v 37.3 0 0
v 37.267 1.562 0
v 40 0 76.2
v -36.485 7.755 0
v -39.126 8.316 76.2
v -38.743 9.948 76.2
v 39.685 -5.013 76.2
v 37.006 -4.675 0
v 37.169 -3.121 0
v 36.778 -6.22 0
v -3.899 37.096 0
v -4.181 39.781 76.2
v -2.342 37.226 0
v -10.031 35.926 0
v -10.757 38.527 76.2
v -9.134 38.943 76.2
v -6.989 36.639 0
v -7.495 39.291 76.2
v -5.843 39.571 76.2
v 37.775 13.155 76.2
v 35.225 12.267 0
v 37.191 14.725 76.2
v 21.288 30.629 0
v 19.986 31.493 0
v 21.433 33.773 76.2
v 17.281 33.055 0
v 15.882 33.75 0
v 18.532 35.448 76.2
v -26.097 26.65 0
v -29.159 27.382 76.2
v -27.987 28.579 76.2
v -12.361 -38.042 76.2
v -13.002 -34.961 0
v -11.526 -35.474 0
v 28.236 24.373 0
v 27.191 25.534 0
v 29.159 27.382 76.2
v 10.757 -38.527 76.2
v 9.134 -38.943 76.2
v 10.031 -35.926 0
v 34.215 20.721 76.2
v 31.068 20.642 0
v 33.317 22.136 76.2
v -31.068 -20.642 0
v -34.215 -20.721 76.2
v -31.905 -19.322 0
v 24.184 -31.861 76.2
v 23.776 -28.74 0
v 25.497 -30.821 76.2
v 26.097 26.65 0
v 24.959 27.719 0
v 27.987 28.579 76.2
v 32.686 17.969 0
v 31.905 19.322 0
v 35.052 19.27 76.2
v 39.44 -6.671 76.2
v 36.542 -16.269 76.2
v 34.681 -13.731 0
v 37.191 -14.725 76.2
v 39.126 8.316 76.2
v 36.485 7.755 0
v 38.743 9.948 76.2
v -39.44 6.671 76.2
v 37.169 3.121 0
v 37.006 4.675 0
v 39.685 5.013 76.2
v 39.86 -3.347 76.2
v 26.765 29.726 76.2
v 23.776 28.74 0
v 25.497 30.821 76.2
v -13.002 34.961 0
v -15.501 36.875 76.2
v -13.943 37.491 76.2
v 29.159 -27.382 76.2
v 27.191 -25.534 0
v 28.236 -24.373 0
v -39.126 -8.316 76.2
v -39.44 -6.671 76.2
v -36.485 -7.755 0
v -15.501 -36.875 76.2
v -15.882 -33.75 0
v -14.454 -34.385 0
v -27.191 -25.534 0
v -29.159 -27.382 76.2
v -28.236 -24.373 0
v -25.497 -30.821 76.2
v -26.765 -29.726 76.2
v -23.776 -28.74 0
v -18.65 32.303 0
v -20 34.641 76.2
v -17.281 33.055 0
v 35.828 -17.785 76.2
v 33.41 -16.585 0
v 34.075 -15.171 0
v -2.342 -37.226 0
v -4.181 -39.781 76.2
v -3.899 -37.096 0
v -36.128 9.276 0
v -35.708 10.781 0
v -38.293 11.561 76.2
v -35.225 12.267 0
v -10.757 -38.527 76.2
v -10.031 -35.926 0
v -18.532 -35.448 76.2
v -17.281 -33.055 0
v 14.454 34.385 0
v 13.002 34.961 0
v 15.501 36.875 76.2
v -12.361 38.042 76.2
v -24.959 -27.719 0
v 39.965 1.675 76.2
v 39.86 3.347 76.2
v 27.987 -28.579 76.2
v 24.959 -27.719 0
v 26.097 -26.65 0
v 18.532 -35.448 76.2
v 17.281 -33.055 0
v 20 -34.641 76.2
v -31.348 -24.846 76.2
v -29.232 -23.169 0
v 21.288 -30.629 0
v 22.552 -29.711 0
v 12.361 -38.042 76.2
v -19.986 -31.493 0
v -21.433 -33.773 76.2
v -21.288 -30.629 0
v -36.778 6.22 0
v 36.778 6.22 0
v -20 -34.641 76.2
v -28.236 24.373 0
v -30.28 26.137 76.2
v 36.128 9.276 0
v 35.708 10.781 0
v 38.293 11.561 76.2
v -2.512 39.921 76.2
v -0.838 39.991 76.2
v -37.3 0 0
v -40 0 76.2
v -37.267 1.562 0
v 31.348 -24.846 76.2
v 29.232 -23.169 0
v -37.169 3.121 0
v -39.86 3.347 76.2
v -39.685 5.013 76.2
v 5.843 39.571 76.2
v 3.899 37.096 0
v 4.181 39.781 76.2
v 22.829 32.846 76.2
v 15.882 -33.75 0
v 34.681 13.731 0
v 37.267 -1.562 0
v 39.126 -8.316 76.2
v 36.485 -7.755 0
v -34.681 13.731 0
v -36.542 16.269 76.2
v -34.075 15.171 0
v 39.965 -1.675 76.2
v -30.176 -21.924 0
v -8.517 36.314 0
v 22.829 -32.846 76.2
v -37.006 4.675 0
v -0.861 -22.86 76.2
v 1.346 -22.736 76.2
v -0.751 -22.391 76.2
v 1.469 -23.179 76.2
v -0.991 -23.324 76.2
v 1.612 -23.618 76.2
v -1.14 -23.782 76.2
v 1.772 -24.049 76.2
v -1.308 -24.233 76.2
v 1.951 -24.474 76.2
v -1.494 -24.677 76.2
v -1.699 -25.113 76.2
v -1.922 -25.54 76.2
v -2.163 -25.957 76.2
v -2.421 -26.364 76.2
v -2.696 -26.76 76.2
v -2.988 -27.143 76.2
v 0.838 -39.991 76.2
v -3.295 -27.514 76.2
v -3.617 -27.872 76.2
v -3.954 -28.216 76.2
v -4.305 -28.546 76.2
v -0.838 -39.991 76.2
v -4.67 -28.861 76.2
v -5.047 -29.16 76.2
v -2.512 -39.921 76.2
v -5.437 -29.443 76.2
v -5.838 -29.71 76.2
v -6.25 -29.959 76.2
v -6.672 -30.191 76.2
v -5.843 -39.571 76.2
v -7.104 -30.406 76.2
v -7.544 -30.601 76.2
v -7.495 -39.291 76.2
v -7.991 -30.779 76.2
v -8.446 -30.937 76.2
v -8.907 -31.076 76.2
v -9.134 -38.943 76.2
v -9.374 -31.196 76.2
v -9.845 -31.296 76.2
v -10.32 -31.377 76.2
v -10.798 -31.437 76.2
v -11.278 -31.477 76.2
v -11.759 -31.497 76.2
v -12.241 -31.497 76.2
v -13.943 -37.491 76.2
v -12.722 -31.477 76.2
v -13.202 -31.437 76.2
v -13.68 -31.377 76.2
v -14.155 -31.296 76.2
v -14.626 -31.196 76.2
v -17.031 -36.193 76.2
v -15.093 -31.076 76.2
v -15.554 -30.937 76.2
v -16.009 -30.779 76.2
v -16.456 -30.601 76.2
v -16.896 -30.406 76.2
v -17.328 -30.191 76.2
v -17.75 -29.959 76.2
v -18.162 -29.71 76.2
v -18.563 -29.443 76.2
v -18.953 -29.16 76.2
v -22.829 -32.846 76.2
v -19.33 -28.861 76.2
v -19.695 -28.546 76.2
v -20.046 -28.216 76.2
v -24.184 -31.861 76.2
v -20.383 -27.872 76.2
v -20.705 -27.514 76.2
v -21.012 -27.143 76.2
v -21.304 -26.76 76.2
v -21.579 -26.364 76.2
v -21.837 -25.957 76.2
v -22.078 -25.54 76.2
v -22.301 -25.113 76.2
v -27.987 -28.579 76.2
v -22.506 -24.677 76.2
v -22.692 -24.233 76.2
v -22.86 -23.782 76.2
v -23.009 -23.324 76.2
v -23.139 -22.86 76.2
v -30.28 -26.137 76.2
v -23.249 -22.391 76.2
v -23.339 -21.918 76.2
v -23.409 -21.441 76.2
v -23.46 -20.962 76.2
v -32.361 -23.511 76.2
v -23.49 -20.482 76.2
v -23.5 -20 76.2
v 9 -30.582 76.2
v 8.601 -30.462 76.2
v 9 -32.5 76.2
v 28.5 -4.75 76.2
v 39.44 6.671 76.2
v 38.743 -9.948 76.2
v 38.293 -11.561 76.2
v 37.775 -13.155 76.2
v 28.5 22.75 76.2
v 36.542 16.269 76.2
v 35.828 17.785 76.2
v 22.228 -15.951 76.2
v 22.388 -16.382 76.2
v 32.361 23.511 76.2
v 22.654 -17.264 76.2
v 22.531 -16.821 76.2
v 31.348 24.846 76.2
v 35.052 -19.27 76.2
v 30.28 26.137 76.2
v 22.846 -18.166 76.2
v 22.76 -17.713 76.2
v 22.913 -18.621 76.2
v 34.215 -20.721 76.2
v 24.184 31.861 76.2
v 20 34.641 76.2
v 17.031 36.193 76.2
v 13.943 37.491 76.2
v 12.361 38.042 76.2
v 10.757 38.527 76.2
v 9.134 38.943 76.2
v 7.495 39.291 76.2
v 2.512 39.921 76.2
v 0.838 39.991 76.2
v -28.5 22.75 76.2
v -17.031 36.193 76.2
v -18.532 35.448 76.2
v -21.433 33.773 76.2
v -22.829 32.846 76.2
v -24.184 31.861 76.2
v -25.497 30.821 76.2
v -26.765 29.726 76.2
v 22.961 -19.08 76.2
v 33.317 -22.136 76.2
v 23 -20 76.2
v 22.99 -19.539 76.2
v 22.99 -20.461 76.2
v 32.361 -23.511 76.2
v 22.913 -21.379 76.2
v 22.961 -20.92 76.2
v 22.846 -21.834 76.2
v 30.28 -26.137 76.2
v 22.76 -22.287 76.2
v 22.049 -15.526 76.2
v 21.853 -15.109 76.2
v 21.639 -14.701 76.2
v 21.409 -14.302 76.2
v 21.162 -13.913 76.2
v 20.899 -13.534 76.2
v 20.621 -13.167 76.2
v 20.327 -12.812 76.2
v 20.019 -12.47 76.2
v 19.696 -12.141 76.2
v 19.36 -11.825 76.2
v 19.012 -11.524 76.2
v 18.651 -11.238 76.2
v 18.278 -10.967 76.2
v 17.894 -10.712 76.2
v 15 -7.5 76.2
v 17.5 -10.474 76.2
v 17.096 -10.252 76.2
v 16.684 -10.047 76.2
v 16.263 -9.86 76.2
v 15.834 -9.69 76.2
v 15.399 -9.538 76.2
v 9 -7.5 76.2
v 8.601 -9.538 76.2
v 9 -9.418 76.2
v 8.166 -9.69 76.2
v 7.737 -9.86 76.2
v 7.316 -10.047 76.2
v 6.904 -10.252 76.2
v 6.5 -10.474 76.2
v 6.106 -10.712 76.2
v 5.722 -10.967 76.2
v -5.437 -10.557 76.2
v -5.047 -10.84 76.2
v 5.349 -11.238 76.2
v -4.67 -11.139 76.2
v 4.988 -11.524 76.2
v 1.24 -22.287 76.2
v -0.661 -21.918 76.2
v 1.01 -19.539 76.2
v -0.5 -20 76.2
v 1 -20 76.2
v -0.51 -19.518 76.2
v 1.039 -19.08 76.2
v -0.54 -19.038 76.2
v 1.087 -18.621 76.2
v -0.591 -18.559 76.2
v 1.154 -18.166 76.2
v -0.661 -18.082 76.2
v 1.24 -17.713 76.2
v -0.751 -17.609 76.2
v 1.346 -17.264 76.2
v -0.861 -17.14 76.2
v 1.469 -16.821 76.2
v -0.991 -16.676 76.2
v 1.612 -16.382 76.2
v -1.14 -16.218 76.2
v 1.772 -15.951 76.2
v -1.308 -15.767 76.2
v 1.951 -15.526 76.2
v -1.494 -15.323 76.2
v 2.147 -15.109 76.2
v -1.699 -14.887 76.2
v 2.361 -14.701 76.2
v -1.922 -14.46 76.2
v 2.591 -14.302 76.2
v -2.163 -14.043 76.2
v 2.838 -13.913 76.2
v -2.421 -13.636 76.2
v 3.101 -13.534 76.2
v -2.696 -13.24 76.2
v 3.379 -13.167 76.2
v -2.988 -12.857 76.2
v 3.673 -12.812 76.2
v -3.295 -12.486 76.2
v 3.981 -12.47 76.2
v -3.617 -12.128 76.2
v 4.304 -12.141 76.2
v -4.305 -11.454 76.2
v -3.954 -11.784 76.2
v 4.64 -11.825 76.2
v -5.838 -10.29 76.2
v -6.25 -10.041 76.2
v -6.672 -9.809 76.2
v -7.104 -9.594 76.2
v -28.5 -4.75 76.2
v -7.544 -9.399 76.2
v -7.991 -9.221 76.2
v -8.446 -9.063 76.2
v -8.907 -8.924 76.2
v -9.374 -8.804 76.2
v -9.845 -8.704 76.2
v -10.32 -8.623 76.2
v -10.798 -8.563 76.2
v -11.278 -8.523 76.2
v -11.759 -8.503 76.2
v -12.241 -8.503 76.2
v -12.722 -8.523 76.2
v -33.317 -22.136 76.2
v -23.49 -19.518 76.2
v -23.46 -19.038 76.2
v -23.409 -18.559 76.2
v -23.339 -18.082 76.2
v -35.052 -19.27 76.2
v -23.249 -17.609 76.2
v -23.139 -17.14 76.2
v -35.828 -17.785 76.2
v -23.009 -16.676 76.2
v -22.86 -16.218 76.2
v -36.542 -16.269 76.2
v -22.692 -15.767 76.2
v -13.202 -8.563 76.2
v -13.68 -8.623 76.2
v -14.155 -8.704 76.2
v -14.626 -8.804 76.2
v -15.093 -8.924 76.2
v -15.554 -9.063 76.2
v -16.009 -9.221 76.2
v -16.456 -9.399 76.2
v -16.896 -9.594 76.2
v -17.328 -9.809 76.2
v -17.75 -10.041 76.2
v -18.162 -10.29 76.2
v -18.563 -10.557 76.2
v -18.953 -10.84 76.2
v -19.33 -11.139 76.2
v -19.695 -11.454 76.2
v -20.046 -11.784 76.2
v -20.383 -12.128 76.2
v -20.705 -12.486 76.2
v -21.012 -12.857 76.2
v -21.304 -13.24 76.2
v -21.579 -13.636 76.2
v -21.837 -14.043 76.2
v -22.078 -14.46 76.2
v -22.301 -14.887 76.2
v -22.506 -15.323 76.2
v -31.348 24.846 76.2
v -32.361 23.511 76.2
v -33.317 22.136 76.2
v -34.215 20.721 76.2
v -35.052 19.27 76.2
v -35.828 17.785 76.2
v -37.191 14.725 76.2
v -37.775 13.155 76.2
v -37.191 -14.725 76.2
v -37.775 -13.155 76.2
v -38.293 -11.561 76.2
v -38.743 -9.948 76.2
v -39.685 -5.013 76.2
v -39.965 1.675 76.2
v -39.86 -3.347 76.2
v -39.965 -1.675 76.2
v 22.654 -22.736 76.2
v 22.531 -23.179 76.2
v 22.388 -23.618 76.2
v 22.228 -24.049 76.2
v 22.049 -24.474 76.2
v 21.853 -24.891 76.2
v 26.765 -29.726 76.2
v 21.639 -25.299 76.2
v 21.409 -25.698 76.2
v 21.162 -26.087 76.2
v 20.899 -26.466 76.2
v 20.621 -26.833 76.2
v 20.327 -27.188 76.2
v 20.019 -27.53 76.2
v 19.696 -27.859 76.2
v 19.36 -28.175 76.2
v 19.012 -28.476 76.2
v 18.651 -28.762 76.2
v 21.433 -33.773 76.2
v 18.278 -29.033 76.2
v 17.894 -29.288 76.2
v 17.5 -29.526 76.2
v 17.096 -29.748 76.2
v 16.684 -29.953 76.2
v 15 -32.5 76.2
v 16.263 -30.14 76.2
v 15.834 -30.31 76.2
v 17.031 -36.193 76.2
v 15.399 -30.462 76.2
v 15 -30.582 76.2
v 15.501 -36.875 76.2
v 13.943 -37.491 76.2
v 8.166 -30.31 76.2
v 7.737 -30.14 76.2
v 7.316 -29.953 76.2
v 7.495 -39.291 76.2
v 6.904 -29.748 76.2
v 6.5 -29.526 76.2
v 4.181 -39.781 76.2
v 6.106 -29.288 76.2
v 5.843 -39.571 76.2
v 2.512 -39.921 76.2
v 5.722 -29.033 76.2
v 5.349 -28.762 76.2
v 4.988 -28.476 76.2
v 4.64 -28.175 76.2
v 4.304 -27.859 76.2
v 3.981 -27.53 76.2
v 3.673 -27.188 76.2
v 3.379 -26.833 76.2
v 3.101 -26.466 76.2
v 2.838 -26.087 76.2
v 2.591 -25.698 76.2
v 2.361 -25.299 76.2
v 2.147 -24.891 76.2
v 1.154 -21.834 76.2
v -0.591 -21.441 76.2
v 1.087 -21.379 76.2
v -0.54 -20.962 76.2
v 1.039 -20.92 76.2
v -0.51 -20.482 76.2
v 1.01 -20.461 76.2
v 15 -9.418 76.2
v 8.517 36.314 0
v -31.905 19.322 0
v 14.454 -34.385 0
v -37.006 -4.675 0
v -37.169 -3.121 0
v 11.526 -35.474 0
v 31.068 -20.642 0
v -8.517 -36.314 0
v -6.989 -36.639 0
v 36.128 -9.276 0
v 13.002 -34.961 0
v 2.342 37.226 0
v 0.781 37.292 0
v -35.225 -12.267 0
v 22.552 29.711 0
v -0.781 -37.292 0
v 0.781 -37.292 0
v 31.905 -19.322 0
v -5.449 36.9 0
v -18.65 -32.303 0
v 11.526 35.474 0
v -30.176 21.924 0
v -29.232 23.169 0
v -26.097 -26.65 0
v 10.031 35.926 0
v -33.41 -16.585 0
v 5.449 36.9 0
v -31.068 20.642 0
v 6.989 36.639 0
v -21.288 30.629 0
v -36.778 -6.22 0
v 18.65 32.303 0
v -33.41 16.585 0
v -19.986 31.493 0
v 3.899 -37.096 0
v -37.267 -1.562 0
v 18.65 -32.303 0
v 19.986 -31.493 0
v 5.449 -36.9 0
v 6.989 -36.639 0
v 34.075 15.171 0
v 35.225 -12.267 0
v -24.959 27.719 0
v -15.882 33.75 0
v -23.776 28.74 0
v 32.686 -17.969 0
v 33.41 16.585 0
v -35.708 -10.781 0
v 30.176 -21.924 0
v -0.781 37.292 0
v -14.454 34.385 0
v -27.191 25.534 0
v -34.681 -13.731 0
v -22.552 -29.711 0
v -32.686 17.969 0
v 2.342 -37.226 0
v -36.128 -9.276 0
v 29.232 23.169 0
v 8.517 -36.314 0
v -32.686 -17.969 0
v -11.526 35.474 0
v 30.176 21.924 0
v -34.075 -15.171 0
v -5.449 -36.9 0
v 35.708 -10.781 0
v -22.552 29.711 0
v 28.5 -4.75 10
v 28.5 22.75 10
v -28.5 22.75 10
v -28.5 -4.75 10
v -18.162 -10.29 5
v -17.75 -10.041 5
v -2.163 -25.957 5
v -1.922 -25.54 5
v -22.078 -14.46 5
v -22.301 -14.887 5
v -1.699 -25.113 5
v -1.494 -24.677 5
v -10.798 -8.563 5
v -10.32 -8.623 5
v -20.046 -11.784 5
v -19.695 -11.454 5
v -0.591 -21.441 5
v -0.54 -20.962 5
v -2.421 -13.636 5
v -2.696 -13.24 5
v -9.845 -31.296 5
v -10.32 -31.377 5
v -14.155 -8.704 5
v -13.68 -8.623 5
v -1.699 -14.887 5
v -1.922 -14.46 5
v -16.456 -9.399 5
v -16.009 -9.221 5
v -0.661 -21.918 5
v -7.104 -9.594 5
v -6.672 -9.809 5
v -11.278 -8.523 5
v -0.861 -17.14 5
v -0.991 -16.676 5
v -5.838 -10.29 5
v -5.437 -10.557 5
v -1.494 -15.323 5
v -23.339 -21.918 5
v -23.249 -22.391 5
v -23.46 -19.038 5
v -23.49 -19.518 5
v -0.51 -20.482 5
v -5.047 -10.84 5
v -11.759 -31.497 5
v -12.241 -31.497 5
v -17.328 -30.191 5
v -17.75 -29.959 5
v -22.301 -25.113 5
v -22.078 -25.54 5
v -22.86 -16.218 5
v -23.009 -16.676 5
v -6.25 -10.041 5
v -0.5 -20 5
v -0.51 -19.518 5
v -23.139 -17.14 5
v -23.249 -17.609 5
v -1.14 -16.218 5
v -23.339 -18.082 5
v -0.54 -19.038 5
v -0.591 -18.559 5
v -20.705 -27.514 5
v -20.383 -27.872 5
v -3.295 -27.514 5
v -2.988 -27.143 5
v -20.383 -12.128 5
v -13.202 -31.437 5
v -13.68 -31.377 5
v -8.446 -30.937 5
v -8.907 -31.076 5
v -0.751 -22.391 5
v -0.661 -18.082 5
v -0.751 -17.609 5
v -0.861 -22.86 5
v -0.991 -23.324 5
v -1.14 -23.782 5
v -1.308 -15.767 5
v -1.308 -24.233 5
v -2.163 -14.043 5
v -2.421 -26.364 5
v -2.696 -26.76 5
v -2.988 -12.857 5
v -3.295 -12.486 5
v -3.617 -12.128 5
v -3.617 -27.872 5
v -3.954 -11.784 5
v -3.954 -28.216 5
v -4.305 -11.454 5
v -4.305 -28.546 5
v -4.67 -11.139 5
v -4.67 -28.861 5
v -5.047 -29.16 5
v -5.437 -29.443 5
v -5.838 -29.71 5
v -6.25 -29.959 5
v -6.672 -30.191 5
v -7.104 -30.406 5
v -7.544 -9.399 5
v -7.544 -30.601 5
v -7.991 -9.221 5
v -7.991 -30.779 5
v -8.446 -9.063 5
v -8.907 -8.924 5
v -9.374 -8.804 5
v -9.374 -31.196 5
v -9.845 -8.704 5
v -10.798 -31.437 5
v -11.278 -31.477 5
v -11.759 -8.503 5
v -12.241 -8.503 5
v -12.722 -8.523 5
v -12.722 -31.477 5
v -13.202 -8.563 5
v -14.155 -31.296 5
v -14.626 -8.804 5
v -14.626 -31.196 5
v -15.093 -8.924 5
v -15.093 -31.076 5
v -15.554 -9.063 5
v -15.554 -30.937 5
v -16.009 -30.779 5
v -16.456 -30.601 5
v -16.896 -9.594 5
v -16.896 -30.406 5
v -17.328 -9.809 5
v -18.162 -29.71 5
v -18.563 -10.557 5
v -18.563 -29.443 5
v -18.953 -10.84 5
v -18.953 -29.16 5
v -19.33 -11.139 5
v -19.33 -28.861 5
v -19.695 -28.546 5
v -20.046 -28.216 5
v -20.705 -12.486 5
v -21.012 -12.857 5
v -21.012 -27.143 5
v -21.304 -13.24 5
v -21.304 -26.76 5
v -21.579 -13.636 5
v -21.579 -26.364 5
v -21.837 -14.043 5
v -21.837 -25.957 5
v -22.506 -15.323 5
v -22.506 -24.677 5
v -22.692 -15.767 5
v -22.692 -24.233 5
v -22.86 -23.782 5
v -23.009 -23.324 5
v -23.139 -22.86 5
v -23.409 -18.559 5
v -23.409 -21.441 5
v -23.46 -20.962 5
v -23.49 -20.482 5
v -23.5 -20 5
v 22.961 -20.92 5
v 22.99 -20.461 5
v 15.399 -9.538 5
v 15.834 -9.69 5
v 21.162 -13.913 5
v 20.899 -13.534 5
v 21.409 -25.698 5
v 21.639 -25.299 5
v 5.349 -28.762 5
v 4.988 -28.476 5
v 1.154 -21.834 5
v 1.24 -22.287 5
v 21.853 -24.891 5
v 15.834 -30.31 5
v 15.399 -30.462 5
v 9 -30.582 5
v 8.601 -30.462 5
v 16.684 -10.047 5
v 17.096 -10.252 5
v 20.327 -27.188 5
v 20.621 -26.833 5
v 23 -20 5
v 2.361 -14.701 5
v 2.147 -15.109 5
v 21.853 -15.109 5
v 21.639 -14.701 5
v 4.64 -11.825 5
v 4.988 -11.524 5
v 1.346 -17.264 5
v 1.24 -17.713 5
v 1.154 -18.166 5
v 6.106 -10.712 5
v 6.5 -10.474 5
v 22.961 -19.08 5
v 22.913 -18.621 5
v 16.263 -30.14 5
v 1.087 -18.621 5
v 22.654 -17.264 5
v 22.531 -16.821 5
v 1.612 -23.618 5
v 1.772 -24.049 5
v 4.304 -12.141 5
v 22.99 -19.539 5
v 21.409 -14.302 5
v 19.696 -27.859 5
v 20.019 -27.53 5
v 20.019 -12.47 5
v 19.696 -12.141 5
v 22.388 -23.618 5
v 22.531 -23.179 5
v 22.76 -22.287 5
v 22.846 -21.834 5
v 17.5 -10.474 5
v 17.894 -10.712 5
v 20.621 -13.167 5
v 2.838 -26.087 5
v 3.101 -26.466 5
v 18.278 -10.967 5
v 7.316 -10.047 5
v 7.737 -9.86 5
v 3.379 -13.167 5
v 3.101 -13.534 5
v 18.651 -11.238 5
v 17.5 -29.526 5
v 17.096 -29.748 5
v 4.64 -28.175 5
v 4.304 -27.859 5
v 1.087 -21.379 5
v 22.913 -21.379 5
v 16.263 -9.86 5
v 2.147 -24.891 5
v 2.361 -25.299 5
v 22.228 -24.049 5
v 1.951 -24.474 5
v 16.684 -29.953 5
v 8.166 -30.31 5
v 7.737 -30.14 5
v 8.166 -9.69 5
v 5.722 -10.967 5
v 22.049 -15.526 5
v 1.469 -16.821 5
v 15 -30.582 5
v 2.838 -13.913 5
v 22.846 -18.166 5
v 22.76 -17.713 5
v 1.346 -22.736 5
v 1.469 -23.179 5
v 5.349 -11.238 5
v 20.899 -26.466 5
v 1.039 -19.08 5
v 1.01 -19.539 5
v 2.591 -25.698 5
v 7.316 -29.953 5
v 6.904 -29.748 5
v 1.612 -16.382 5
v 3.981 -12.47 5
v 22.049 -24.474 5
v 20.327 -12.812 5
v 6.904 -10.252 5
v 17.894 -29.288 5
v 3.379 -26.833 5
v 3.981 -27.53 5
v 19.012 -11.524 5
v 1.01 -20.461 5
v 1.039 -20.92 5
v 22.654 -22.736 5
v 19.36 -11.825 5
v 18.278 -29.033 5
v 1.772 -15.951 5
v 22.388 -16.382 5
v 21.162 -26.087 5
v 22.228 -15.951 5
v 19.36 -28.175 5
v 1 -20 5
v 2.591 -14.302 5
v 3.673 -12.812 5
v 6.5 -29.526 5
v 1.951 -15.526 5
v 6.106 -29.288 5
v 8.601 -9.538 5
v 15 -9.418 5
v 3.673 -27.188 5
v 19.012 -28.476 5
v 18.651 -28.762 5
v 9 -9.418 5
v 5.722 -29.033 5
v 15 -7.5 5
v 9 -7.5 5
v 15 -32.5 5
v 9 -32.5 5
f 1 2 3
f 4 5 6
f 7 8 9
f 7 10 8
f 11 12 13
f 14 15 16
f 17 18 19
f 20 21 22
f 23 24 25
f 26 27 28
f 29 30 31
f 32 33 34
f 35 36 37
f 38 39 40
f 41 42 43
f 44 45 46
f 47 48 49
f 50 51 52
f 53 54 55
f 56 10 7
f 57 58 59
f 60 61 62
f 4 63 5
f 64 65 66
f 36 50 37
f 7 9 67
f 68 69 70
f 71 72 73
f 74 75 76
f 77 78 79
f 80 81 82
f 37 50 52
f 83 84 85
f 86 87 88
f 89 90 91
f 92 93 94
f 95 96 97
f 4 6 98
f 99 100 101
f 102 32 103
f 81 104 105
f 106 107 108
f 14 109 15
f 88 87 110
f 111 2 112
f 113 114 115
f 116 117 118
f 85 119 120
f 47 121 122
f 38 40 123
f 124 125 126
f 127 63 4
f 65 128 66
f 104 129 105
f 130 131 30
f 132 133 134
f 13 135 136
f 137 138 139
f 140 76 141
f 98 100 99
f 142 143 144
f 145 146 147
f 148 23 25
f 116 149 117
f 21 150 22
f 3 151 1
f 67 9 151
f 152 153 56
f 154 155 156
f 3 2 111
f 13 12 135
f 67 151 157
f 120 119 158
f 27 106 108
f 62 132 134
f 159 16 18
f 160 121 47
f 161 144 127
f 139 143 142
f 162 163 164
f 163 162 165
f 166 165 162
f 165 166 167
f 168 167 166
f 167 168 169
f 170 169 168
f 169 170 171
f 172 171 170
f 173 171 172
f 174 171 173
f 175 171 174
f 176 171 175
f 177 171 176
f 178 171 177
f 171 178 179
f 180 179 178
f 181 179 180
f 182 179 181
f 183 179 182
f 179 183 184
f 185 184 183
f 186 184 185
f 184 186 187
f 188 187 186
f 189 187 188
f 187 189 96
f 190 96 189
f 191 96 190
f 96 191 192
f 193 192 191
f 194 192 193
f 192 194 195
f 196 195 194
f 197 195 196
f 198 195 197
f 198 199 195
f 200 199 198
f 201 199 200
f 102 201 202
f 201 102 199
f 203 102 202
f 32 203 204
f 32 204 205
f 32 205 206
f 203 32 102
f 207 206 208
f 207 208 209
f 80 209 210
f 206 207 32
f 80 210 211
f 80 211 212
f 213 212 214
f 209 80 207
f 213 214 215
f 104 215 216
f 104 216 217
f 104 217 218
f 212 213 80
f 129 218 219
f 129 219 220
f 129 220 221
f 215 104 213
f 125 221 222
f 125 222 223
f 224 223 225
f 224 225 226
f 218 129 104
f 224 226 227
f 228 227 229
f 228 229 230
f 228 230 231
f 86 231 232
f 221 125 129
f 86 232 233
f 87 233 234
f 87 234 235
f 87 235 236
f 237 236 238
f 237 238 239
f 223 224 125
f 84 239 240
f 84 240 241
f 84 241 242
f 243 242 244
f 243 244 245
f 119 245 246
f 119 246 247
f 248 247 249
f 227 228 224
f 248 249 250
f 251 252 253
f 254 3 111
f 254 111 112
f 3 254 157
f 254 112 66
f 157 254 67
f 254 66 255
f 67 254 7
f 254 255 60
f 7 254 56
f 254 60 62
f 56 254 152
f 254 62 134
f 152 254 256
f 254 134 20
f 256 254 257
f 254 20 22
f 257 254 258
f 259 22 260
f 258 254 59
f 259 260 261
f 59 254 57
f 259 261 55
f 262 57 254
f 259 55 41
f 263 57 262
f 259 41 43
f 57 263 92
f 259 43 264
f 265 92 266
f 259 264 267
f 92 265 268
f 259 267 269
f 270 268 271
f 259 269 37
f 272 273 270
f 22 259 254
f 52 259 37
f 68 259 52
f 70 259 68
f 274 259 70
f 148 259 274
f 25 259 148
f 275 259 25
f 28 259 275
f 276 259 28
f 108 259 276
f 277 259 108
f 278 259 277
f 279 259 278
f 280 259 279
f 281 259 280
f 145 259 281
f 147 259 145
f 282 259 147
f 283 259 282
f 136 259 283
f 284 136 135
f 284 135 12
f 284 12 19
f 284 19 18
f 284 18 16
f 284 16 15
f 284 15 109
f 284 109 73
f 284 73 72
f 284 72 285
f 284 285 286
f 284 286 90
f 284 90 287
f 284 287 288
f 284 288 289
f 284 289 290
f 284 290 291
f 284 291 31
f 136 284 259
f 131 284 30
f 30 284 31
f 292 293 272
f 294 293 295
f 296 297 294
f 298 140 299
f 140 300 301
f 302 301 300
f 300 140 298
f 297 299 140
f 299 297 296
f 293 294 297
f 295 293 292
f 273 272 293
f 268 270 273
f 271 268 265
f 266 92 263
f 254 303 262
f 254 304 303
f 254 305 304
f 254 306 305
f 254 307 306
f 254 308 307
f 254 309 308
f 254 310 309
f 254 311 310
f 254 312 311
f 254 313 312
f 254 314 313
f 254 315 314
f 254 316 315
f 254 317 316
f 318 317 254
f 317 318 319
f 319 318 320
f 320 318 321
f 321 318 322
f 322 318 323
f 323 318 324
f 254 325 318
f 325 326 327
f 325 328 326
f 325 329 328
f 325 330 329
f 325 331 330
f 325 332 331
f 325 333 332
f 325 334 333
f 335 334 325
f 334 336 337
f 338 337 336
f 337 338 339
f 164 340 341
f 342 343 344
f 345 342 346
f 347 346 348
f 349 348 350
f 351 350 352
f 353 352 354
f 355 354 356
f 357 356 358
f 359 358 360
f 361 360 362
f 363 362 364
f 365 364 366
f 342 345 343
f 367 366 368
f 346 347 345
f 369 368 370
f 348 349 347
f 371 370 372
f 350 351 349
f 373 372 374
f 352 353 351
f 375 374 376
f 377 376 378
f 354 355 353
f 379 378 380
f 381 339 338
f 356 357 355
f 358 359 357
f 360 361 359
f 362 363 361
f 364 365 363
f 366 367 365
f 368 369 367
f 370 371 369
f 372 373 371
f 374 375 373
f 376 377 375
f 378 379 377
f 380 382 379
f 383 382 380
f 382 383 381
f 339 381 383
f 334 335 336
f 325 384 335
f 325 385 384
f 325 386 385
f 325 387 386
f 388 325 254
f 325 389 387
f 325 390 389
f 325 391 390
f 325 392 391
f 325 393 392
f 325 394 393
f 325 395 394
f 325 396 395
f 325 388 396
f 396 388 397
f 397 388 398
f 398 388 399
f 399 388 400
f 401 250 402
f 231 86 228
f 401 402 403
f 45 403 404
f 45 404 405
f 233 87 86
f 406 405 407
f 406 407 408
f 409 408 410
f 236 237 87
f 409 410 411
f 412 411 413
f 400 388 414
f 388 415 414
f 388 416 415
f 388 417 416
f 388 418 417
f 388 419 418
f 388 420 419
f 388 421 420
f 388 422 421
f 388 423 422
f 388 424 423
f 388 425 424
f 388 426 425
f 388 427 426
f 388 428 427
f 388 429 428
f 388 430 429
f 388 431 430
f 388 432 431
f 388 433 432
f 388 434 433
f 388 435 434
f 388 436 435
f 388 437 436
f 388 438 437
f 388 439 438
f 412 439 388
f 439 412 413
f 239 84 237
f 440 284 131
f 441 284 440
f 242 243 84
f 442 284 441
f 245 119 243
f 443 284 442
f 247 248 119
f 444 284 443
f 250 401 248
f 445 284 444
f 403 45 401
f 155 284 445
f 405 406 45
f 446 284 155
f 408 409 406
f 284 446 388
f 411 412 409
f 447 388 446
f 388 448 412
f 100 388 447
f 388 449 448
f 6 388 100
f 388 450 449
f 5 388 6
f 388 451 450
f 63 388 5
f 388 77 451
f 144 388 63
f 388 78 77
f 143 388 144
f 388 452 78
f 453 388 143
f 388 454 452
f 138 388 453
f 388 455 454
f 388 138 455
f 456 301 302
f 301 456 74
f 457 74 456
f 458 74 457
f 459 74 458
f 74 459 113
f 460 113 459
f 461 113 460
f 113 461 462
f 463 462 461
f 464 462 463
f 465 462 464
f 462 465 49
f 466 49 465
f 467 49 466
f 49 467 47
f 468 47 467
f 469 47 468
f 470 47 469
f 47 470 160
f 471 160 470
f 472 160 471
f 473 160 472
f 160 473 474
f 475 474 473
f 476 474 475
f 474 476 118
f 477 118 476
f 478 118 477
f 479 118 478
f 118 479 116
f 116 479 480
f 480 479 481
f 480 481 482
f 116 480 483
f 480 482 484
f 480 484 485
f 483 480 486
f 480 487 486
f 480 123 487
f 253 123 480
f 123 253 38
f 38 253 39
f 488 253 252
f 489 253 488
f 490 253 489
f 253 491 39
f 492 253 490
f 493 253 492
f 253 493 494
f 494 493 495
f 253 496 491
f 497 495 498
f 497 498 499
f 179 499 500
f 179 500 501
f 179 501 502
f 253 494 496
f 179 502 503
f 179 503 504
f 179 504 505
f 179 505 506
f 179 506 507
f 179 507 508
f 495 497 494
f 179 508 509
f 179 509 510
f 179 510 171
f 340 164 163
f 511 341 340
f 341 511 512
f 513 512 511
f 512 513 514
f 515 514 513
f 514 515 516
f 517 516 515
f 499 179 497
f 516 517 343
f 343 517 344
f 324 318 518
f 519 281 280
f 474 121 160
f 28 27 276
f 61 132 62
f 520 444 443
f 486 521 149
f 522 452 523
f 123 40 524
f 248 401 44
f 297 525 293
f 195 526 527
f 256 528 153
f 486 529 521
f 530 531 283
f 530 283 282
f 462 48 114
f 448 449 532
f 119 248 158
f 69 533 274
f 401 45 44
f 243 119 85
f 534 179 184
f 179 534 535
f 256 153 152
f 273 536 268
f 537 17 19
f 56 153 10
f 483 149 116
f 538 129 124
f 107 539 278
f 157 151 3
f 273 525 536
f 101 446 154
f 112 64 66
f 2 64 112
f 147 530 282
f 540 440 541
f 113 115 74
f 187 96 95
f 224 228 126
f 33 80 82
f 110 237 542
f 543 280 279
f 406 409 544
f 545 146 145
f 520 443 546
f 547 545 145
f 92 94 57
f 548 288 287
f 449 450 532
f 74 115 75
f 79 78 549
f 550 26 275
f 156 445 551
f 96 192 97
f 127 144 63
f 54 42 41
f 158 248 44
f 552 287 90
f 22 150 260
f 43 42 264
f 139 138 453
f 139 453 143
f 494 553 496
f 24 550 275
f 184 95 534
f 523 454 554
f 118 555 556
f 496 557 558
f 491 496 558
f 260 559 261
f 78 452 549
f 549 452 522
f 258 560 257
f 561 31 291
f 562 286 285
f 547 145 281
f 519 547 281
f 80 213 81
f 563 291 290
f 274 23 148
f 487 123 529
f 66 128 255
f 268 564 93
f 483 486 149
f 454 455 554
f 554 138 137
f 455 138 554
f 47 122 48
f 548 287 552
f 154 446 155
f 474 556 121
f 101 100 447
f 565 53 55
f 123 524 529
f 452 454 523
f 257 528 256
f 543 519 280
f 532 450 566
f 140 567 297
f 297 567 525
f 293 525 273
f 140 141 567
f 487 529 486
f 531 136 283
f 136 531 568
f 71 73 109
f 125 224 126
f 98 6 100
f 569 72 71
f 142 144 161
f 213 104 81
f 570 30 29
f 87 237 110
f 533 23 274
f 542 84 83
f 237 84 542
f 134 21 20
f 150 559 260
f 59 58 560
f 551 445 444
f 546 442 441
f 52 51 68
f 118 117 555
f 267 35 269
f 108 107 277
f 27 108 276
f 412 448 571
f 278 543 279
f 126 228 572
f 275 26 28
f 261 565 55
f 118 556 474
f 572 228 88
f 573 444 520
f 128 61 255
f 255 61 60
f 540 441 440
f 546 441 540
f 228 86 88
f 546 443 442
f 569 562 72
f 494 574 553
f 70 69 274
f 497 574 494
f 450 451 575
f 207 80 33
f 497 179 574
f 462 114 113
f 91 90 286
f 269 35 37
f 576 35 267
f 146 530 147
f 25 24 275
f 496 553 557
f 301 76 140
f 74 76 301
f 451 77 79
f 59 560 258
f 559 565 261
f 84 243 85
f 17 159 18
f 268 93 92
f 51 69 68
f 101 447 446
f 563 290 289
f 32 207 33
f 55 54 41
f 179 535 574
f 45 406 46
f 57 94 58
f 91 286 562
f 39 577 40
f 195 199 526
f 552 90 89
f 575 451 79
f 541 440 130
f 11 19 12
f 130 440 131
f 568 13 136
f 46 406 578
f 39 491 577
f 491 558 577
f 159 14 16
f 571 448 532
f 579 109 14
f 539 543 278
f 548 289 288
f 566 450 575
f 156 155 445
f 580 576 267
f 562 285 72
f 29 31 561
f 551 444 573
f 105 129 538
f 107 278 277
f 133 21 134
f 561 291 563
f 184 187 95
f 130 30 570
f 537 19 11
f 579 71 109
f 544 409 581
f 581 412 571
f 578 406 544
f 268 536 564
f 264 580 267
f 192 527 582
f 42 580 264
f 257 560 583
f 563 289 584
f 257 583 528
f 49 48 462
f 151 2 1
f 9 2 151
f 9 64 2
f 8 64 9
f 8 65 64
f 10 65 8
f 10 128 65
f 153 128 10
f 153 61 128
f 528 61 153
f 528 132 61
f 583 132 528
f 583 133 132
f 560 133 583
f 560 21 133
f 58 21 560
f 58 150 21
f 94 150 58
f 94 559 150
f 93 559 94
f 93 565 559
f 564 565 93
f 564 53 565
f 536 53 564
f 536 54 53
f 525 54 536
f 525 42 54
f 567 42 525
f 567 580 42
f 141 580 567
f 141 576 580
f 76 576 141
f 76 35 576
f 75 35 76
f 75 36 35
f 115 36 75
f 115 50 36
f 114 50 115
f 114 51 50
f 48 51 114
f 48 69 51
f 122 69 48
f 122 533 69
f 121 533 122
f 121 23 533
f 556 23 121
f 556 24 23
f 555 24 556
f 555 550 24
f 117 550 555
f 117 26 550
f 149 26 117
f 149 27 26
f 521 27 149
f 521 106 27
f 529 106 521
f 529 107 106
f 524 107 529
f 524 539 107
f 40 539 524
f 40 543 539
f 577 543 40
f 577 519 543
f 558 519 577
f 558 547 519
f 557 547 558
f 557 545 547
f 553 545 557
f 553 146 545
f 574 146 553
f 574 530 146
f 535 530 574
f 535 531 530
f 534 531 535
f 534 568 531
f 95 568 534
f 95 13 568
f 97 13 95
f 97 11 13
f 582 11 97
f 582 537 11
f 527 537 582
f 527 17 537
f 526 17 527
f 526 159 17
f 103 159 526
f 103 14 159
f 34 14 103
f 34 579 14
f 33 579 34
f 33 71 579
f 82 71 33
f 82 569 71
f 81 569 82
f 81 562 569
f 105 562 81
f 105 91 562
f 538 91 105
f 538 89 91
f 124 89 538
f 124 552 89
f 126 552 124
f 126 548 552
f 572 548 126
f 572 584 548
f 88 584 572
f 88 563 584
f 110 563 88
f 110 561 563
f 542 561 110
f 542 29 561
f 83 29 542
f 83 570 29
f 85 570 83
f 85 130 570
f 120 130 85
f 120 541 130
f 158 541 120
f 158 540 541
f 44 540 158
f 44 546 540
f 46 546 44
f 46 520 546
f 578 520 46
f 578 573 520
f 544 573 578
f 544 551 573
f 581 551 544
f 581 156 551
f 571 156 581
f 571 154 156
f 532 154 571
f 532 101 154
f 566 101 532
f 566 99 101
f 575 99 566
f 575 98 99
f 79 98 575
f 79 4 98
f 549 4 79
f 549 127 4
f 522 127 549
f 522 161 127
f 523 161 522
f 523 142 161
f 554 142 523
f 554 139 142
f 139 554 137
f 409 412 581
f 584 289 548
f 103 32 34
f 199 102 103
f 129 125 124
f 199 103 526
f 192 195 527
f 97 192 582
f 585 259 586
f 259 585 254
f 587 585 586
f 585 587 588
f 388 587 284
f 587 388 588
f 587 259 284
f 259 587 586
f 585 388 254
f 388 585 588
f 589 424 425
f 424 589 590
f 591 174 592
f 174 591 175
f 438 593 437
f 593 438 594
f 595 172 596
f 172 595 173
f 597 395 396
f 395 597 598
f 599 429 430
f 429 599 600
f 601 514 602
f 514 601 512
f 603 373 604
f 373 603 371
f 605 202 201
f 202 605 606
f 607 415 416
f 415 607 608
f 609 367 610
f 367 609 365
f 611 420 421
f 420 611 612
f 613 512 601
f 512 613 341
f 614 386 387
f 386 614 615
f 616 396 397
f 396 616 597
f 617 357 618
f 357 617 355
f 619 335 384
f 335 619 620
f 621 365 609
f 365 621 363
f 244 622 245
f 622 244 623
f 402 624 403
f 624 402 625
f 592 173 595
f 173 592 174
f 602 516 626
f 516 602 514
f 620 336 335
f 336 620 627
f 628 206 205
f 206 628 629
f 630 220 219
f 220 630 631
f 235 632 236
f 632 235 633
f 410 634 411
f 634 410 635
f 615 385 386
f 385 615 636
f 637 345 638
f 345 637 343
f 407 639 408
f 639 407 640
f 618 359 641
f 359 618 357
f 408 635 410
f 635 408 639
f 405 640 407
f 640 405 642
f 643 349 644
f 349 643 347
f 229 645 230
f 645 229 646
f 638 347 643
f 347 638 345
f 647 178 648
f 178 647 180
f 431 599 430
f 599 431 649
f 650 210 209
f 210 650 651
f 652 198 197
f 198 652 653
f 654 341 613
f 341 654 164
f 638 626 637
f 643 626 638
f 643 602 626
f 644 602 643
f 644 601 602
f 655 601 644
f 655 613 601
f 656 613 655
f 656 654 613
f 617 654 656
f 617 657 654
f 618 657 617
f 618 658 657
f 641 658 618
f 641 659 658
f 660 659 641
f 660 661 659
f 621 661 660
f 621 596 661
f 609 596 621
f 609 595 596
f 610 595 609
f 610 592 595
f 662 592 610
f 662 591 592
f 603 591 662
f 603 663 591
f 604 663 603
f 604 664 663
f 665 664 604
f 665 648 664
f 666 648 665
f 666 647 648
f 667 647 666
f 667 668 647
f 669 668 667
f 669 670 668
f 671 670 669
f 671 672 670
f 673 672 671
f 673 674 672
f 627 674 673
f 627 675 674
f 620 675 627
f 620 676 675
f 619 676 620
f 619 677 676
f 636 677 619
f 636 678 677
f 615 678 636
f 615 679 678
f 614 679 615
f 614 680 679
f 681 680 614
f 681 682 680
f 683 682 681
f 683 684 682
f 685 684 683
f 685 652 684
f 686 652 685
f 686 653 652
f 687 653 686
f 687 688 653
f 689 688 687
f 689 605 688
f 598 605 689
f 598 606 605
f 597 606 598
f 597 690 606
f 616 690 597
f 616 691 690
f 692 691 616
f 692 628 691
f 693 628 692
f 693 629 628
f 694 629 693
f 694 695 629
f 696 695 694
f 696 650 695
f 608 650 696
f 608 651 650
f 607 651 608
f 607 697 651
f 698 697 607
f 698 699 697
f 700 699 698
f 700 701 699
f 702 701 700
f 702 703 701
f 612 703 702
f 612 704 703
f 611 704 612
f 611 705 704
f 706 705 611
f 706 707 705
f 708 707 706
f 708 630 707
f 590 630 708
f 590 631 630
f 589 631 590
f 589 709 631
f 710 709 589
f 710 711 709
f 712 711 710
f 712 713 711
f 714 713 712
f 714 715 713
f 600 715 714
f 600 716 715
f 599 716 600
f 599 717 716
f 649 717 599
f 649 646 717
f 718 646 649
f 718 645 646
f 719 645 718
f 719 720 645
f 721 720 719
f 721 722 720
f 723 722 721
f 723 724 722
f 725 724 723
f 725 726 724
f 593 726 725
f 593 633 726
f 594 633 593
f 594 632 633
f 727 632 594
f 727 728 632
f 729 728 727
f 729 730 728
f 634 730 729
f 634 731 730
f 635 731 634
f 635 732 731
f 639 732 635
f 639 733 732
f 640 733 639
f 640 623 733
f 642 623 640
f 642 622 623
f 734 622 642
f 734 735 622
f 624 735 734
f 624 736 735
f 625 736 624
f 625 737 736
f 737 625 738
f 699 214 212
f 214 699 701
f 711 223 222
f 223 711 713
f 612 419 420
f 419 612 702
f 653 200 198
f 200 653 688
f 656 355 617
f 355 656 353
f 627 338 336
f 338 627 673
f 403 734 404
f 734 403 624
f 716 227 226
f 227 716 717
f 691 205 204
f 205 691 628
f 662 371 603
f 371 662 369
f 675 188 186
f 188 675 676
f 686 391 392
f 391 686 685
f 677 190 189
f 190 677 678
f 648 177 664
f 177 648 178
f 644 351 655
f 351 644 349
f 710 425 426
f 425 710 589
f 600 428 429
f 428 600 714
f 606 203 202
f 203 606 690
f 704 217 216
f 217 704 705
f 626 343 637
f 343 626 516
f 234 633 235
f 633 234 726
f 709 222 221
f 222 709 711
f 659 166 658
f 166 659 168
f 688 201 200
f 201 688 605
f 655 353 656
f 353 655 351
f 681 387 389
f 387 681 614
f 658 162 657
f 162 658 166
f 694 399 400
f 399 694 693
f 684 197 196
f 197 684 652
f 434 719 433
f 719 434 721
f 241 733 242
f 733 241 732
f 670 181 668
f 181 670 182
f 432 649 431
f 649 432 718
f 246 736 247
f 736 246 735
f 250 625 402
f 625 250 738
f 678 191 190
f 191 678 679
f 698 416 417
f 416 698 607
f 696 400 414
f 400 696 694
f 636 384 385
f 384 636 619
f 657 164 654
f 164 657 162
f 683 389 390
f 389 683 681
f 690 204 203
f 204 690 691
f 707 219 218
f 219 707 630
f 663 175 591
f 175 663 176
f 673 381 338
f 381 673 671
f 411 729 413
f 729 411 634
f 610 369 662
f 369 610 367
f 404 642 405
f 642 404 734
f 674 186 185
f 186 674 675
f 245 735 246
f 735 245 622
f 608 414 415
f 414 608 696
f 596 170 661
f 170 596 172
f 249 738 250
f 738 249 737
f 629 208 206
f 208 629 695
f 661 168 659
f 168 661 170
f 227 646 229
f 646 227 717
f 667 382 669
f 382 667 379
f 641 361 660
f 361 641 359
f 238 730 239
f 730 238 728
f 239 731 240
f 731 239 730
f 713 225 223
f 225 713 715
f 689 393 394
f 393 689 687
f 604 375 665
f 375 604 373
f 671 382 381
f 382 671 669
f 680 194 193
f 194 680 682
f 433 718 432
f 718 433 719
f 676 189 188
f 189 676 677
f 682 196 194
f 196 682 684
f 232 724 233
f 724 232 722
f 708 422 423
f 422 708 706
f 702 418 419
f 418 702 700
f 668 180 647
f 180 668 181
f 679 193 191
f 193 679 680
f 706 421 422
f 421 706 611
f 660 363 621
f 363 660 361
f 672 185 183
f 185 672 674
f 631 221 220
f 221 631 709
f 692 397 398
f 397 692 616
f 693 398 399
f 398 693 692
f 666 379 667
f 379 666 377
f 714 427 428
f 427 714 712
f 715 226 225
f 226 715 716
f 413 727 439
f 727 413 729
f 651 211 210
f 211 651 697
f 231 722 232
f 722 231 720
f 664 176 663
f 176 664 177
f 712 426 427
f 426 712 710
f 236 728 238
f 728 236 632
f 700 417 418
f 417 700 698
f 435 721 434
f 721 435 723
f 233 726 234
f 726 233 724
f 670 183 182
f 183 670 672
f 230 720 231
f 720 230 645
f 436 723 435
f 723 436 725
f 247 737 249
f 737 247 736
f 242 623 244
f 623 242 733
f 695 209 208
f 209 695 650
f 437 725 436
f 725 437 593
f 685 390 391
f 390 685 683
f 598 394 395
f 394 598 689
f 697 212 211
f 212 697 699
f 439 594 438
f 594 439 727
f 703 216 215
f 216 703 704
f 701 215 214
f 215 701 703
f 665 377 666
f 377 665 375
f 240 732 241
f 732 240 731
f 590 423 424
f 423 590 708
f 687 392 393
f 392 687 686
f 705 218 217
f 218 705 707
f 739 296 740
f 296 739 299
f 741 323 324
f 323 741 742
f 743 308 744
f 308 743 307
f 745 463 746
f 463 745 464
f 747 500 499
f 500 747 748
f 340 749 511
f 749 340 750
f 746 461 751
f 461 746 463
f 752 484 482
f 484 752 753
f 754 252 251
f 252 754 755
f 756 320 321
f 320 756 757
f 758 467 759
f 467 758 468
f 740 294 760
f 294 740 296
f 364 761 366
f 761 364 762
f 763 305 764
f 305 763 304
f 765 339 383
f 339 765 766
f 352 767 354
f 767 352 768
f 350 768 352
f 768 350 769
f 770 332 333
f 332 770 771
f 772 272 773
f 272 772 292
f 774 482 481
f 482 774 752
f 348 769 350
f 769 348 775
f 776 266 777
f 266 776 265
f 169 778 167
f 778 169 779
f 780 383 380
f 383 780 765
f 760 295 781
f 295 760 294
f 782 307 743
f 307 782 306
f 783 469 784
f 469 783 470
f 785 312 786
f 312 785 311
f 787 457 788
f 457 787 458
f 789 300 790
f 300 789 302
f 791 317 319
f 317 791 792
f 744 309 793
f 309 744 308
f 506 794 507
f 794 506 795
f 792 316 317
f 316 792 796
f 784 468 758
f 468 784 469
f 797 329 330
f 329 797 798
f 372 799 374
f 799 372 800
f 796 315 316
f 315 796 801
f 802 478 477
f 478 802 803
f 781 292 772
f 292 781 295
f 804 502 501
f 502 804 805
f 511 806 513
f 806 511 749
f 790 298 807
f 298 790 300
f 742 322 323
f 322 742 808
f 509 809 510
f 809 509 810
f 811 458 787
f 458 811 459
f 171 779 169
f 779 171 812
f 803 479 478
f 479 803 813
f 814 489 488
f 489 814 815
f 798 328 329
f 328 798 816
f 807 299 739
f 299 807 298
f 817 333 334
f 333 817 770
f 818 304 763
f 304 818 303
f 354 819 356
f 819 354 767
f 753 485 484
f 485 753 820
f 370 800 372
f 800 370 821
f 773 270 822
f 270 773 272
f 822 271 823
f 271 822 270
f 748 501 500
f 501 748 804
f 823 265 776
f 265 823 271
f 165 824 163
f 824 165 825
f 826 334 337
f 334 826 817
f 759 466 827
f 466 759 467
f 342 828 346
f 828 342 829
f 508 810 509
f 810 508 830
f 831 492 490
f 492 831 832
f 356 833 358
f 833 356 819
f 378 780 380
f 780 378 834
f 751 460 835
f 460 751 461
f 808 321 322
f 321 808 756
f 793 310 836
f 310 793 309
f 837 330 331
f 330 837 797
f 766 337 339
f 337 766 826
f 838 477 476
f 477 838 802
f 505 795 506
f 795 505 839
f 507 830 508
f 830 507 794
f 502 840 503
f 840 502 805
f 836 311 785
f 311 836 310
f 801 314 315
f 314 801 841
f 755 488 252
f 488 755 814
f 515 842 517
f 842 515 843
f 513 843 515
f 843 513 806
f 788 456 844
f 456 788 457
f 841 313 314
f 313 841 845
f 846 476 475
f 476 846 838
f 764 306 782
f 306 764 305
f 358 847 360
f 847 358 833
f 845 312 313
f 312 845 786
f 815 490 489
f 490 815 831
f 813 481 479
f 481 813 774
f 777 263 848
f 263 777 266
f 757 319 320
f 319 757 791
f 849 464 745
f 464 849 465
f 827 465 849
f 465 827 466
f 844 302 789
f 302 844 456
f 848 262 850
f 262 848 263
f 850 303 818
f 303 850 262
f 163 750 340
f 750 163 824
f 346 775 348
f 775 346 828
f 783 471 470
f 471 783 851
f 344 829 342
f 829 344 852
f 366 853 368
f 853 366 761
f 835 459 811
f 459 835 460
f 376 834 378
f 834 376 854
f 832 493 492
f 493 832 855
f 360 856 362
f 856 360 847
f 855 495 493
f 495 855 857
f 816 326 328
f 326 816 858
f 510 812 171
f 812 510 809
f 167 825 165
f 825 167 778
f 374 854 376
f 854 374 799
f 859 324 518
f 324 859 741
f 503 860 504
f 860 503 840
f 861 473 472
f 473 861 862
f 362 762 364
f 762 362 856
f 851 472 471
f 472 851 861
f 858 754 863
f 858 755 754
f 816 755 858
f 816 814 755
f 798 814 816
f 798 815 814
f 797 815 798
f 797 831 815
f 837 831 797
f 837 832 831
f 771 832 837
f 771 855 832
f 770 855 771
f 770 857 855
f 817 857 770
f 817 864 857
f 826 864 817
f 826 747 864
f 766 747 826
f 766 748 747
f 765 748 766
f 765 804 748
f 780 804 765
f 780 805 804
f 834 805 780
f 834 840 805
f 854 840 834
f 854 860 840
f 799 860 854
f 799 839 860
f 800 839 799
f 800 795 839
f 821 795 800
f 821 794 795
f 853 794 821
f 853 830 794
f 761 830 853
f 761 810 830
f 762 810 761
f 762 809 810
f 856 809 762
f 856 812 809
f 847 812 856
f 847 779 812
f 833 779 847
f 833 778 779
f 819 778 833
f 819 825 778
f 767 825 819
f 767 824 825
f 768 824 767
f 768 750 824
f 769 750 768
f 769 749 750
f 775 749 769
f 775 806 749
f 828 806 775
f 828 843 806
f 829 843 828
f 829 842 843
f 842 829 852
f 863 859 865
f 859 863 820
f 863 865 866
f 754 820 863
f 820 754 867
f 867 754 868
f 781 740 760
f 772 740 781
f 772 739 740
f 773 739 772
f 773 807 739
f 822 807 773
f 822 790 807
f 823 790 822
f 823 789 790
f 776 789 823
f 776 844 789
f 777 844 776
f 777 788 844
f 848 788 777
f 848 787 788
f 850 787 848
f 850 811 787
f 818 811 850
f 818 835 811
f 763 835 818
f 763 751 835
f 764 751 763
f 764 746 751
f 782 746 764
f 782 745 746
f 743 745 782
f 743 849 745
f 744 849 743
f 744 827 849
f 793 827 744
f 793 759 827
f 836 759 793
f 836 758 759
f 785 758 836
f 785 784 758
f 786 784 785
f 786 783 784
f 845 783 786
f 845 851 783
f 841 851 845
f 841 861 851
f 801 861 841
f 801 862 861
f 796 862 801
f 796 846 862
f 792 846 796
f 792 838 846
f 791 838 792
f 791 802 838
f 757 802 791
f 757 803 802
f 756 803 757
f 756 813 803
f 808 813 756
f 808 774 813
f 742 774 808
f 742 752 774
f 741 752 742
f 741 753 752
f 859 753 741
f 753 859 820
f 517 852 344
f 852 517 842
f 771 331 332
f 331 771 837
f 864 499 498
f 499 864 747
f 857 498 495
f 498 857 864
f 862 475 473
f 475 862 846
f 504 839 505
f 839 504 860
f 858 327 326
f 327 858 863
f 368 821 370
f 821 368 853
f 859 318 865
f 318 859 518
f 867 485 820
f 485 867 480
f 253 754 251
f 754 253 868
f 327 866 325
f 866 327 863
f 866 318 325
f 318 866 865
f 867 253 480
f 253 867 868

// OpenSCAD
$fn = 150;
difference(){
cylinder (76.2,d1=74.6, d2=80.0);
    //translate ([9,19,25]) cylinder (80, d=28);  // Mod part 1
    //translate ([-9,19,25]) cylinder (80, d=28); // Mod part 2
    translate ([0,9,50]) cube([57, 27.5, 80], center=true); // Mod part 3
    //translate ([24,-3,15]) cylinder (80, d=22); //18650 No.1
    translate ([-12,-20,5]) cylinder (80, d=23); //Liquid
    translate ([12,-20,5]) cylinder (80, d=22); //Liquid
    translate ([12,-20,45]) cube([6, 25, 80], center=true); // Mod part 3
}
